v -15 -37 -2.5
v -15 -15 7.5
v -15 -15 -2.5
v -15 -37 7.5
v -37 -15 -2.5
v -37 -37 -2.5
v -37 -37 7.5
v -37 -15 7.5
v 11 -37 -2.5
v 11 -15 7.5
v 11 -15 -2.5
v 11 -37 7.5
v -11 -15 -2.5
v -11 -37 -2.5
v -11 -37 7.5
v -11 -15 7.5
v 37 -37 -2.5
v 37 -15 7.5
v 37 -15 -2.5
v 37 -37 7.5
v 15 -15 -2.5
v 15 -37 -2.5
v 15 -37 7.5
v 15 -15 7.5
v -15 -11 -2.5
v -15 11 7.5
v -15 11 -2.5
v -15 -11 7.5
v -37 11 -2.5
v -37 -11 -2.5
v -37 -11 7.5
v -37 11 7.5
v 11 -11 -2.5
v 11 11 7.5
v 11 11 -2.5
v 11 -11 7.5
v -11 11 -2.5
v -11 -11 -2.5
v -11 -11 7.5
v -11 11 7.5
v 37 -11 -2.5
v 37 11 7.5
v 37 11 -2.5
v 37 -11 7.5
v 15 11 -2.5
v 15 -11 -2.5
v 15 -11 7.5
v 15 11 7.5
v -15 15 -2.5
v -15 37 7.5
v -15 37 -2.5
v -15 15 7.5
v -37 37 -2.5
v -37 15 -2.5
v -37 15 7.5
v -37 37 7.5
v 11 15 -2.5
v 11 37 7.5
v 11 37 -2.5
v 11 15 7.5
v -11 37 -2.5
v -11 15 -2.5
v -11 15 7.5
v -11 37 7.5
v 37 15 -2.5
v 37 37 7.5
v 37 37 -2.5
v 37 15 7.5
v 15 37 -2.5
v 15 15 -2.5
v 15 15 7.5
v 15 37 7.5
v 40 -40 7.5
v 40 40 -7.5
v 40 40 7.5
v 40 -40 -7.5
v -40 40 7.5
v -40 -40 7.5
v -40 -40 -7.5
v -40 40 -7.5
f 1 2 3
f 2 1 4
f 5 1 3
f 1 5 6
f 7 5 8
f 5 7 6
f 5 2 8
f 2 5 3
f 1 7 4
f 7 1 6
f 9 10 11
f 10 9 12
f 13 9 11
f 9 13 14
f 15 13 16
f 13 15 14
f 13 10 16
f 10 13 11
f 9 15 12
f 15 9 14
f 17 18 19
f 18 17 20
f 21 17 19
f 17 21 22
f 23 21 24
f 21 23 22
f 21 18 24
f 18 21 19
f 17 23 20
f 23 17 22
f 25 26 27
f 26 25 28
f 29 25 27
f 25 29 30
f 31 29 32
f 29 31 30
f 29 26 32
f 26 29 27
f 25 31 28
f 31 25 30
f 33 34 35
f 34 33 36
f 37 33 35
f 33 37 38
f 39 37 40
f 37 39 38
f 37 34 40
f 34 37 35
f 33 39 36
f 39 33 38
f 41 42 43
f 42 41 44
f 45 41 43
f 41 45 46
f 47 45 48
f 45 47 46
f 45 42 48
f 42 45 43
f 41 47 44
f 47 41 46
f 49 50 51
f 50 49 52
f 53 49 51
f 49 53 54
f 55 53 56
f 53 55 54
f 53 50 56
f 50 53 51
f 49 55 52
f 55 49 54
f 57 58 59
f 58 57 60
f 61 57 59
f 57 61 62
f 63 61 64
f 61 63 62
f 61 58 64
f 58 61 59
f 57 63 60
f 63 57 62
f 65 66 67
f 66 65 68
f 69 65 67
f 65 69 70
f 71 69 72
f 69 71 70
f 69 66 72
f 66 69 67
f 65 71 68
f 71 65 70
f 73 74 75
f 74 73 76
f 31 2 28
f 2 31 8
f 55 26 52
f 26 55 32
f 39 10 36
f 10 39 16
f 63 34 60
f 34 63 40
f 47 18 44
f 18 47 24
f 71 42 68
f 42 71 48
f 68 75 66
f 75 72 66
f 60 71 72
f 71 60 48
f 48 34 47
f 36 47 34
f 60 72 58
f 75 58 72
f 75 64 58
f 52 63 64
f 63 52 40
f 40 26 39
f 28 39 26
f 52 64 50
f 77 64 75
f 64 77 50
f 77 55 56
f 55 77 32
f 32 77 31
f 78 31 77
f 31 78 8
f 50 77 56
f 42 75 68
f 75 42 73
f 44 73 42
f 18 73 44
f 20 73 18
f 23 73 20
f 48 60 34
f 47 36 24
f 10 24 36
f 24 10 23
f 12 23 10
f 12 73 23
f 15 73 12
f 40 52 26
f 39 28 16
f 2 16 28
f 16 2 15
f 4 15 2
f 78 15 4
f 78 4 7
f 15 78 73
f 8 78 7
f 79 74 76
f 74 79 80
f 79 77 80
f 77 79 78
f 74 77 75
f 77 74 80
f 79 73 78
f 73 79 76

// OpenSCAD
$fn = 32;

// ----------------------------------------------------------------------
// Pocket plate 80 x 80 x 15
// 3 x 3 pockets 22 mm square, 10 mm deep
// ----------------------------------------------------------------------

// --- parameters (mm) ---
thickness = 15;  // plate thickness
floor_t = 5;     // material left under each pocket
pocket = 22;     // pocket side length
pitch_x = 26;    // pocket pitch along X
pitch_y = 26;    // pocket pitch along Y
cols = 3;        // pockets per row
rows = 3;        // rows of pockets

// --- derived feature positions (mm) ---
depth = thickness - floor_t;        // = 10   pocket depth, down to the floor
span_x = (cols - 1) * pitch_x;      // = 52   distance between outer pockets
span_y = (rows - 1) * pitch_y;      // = 52   distance between outer pocket rows
origin_x = -span_x / 2;             // = -26   X of the first pocket
origin_y = -span_y / 2;             // = -26   Y of the first pocket
plate = [span_x + pocket + 6, span_y + pocket + 6, thickness];  // = [80, 80, 15]   overall size: pockets plus 3 mm of wall on each side
feature_centers = [
  [origin_x + 0 * pitch_x, origin_y + 0 * pitch_y],
  [origin_x + 1 * pitch_x, origin_y + 0 * pitch_y],
  [origin_x + 2 * pitch_x, origin_y + 0 * pitch_y],
  [origin_x + 0 * pitch_x, origin_y + 1 * pitch_y],
  [origin_x + 1 * pitch_x, origin_y + 1 * pitch_y],
  [origin_x + 2 * pitch_x, origin_y + 1 * pitch_y],
  [origin_x + 0 * pitch_x, origin_y + 2 * pitch_y],
  [origin_x + 1 * pitch_x, origin_y + 2 * pitch_y],
  [origin_x + 2 * pitch_x, origin_y + 2 * pitch_y]
];   // pocket centres, used verbatim by the cutter loop

// plate outline, then one pocket per centre in feature_centers
difference() {
  cube(plate, center = true);
  for (centre = feature_centers)
    translate([centre[0] - pocket / 2, centre[1] - pocket / 2, plate[2] / 2 - depth])
      cube([pocket, pocket, depth + 1]);  // centred on the declared pocket centre
}
